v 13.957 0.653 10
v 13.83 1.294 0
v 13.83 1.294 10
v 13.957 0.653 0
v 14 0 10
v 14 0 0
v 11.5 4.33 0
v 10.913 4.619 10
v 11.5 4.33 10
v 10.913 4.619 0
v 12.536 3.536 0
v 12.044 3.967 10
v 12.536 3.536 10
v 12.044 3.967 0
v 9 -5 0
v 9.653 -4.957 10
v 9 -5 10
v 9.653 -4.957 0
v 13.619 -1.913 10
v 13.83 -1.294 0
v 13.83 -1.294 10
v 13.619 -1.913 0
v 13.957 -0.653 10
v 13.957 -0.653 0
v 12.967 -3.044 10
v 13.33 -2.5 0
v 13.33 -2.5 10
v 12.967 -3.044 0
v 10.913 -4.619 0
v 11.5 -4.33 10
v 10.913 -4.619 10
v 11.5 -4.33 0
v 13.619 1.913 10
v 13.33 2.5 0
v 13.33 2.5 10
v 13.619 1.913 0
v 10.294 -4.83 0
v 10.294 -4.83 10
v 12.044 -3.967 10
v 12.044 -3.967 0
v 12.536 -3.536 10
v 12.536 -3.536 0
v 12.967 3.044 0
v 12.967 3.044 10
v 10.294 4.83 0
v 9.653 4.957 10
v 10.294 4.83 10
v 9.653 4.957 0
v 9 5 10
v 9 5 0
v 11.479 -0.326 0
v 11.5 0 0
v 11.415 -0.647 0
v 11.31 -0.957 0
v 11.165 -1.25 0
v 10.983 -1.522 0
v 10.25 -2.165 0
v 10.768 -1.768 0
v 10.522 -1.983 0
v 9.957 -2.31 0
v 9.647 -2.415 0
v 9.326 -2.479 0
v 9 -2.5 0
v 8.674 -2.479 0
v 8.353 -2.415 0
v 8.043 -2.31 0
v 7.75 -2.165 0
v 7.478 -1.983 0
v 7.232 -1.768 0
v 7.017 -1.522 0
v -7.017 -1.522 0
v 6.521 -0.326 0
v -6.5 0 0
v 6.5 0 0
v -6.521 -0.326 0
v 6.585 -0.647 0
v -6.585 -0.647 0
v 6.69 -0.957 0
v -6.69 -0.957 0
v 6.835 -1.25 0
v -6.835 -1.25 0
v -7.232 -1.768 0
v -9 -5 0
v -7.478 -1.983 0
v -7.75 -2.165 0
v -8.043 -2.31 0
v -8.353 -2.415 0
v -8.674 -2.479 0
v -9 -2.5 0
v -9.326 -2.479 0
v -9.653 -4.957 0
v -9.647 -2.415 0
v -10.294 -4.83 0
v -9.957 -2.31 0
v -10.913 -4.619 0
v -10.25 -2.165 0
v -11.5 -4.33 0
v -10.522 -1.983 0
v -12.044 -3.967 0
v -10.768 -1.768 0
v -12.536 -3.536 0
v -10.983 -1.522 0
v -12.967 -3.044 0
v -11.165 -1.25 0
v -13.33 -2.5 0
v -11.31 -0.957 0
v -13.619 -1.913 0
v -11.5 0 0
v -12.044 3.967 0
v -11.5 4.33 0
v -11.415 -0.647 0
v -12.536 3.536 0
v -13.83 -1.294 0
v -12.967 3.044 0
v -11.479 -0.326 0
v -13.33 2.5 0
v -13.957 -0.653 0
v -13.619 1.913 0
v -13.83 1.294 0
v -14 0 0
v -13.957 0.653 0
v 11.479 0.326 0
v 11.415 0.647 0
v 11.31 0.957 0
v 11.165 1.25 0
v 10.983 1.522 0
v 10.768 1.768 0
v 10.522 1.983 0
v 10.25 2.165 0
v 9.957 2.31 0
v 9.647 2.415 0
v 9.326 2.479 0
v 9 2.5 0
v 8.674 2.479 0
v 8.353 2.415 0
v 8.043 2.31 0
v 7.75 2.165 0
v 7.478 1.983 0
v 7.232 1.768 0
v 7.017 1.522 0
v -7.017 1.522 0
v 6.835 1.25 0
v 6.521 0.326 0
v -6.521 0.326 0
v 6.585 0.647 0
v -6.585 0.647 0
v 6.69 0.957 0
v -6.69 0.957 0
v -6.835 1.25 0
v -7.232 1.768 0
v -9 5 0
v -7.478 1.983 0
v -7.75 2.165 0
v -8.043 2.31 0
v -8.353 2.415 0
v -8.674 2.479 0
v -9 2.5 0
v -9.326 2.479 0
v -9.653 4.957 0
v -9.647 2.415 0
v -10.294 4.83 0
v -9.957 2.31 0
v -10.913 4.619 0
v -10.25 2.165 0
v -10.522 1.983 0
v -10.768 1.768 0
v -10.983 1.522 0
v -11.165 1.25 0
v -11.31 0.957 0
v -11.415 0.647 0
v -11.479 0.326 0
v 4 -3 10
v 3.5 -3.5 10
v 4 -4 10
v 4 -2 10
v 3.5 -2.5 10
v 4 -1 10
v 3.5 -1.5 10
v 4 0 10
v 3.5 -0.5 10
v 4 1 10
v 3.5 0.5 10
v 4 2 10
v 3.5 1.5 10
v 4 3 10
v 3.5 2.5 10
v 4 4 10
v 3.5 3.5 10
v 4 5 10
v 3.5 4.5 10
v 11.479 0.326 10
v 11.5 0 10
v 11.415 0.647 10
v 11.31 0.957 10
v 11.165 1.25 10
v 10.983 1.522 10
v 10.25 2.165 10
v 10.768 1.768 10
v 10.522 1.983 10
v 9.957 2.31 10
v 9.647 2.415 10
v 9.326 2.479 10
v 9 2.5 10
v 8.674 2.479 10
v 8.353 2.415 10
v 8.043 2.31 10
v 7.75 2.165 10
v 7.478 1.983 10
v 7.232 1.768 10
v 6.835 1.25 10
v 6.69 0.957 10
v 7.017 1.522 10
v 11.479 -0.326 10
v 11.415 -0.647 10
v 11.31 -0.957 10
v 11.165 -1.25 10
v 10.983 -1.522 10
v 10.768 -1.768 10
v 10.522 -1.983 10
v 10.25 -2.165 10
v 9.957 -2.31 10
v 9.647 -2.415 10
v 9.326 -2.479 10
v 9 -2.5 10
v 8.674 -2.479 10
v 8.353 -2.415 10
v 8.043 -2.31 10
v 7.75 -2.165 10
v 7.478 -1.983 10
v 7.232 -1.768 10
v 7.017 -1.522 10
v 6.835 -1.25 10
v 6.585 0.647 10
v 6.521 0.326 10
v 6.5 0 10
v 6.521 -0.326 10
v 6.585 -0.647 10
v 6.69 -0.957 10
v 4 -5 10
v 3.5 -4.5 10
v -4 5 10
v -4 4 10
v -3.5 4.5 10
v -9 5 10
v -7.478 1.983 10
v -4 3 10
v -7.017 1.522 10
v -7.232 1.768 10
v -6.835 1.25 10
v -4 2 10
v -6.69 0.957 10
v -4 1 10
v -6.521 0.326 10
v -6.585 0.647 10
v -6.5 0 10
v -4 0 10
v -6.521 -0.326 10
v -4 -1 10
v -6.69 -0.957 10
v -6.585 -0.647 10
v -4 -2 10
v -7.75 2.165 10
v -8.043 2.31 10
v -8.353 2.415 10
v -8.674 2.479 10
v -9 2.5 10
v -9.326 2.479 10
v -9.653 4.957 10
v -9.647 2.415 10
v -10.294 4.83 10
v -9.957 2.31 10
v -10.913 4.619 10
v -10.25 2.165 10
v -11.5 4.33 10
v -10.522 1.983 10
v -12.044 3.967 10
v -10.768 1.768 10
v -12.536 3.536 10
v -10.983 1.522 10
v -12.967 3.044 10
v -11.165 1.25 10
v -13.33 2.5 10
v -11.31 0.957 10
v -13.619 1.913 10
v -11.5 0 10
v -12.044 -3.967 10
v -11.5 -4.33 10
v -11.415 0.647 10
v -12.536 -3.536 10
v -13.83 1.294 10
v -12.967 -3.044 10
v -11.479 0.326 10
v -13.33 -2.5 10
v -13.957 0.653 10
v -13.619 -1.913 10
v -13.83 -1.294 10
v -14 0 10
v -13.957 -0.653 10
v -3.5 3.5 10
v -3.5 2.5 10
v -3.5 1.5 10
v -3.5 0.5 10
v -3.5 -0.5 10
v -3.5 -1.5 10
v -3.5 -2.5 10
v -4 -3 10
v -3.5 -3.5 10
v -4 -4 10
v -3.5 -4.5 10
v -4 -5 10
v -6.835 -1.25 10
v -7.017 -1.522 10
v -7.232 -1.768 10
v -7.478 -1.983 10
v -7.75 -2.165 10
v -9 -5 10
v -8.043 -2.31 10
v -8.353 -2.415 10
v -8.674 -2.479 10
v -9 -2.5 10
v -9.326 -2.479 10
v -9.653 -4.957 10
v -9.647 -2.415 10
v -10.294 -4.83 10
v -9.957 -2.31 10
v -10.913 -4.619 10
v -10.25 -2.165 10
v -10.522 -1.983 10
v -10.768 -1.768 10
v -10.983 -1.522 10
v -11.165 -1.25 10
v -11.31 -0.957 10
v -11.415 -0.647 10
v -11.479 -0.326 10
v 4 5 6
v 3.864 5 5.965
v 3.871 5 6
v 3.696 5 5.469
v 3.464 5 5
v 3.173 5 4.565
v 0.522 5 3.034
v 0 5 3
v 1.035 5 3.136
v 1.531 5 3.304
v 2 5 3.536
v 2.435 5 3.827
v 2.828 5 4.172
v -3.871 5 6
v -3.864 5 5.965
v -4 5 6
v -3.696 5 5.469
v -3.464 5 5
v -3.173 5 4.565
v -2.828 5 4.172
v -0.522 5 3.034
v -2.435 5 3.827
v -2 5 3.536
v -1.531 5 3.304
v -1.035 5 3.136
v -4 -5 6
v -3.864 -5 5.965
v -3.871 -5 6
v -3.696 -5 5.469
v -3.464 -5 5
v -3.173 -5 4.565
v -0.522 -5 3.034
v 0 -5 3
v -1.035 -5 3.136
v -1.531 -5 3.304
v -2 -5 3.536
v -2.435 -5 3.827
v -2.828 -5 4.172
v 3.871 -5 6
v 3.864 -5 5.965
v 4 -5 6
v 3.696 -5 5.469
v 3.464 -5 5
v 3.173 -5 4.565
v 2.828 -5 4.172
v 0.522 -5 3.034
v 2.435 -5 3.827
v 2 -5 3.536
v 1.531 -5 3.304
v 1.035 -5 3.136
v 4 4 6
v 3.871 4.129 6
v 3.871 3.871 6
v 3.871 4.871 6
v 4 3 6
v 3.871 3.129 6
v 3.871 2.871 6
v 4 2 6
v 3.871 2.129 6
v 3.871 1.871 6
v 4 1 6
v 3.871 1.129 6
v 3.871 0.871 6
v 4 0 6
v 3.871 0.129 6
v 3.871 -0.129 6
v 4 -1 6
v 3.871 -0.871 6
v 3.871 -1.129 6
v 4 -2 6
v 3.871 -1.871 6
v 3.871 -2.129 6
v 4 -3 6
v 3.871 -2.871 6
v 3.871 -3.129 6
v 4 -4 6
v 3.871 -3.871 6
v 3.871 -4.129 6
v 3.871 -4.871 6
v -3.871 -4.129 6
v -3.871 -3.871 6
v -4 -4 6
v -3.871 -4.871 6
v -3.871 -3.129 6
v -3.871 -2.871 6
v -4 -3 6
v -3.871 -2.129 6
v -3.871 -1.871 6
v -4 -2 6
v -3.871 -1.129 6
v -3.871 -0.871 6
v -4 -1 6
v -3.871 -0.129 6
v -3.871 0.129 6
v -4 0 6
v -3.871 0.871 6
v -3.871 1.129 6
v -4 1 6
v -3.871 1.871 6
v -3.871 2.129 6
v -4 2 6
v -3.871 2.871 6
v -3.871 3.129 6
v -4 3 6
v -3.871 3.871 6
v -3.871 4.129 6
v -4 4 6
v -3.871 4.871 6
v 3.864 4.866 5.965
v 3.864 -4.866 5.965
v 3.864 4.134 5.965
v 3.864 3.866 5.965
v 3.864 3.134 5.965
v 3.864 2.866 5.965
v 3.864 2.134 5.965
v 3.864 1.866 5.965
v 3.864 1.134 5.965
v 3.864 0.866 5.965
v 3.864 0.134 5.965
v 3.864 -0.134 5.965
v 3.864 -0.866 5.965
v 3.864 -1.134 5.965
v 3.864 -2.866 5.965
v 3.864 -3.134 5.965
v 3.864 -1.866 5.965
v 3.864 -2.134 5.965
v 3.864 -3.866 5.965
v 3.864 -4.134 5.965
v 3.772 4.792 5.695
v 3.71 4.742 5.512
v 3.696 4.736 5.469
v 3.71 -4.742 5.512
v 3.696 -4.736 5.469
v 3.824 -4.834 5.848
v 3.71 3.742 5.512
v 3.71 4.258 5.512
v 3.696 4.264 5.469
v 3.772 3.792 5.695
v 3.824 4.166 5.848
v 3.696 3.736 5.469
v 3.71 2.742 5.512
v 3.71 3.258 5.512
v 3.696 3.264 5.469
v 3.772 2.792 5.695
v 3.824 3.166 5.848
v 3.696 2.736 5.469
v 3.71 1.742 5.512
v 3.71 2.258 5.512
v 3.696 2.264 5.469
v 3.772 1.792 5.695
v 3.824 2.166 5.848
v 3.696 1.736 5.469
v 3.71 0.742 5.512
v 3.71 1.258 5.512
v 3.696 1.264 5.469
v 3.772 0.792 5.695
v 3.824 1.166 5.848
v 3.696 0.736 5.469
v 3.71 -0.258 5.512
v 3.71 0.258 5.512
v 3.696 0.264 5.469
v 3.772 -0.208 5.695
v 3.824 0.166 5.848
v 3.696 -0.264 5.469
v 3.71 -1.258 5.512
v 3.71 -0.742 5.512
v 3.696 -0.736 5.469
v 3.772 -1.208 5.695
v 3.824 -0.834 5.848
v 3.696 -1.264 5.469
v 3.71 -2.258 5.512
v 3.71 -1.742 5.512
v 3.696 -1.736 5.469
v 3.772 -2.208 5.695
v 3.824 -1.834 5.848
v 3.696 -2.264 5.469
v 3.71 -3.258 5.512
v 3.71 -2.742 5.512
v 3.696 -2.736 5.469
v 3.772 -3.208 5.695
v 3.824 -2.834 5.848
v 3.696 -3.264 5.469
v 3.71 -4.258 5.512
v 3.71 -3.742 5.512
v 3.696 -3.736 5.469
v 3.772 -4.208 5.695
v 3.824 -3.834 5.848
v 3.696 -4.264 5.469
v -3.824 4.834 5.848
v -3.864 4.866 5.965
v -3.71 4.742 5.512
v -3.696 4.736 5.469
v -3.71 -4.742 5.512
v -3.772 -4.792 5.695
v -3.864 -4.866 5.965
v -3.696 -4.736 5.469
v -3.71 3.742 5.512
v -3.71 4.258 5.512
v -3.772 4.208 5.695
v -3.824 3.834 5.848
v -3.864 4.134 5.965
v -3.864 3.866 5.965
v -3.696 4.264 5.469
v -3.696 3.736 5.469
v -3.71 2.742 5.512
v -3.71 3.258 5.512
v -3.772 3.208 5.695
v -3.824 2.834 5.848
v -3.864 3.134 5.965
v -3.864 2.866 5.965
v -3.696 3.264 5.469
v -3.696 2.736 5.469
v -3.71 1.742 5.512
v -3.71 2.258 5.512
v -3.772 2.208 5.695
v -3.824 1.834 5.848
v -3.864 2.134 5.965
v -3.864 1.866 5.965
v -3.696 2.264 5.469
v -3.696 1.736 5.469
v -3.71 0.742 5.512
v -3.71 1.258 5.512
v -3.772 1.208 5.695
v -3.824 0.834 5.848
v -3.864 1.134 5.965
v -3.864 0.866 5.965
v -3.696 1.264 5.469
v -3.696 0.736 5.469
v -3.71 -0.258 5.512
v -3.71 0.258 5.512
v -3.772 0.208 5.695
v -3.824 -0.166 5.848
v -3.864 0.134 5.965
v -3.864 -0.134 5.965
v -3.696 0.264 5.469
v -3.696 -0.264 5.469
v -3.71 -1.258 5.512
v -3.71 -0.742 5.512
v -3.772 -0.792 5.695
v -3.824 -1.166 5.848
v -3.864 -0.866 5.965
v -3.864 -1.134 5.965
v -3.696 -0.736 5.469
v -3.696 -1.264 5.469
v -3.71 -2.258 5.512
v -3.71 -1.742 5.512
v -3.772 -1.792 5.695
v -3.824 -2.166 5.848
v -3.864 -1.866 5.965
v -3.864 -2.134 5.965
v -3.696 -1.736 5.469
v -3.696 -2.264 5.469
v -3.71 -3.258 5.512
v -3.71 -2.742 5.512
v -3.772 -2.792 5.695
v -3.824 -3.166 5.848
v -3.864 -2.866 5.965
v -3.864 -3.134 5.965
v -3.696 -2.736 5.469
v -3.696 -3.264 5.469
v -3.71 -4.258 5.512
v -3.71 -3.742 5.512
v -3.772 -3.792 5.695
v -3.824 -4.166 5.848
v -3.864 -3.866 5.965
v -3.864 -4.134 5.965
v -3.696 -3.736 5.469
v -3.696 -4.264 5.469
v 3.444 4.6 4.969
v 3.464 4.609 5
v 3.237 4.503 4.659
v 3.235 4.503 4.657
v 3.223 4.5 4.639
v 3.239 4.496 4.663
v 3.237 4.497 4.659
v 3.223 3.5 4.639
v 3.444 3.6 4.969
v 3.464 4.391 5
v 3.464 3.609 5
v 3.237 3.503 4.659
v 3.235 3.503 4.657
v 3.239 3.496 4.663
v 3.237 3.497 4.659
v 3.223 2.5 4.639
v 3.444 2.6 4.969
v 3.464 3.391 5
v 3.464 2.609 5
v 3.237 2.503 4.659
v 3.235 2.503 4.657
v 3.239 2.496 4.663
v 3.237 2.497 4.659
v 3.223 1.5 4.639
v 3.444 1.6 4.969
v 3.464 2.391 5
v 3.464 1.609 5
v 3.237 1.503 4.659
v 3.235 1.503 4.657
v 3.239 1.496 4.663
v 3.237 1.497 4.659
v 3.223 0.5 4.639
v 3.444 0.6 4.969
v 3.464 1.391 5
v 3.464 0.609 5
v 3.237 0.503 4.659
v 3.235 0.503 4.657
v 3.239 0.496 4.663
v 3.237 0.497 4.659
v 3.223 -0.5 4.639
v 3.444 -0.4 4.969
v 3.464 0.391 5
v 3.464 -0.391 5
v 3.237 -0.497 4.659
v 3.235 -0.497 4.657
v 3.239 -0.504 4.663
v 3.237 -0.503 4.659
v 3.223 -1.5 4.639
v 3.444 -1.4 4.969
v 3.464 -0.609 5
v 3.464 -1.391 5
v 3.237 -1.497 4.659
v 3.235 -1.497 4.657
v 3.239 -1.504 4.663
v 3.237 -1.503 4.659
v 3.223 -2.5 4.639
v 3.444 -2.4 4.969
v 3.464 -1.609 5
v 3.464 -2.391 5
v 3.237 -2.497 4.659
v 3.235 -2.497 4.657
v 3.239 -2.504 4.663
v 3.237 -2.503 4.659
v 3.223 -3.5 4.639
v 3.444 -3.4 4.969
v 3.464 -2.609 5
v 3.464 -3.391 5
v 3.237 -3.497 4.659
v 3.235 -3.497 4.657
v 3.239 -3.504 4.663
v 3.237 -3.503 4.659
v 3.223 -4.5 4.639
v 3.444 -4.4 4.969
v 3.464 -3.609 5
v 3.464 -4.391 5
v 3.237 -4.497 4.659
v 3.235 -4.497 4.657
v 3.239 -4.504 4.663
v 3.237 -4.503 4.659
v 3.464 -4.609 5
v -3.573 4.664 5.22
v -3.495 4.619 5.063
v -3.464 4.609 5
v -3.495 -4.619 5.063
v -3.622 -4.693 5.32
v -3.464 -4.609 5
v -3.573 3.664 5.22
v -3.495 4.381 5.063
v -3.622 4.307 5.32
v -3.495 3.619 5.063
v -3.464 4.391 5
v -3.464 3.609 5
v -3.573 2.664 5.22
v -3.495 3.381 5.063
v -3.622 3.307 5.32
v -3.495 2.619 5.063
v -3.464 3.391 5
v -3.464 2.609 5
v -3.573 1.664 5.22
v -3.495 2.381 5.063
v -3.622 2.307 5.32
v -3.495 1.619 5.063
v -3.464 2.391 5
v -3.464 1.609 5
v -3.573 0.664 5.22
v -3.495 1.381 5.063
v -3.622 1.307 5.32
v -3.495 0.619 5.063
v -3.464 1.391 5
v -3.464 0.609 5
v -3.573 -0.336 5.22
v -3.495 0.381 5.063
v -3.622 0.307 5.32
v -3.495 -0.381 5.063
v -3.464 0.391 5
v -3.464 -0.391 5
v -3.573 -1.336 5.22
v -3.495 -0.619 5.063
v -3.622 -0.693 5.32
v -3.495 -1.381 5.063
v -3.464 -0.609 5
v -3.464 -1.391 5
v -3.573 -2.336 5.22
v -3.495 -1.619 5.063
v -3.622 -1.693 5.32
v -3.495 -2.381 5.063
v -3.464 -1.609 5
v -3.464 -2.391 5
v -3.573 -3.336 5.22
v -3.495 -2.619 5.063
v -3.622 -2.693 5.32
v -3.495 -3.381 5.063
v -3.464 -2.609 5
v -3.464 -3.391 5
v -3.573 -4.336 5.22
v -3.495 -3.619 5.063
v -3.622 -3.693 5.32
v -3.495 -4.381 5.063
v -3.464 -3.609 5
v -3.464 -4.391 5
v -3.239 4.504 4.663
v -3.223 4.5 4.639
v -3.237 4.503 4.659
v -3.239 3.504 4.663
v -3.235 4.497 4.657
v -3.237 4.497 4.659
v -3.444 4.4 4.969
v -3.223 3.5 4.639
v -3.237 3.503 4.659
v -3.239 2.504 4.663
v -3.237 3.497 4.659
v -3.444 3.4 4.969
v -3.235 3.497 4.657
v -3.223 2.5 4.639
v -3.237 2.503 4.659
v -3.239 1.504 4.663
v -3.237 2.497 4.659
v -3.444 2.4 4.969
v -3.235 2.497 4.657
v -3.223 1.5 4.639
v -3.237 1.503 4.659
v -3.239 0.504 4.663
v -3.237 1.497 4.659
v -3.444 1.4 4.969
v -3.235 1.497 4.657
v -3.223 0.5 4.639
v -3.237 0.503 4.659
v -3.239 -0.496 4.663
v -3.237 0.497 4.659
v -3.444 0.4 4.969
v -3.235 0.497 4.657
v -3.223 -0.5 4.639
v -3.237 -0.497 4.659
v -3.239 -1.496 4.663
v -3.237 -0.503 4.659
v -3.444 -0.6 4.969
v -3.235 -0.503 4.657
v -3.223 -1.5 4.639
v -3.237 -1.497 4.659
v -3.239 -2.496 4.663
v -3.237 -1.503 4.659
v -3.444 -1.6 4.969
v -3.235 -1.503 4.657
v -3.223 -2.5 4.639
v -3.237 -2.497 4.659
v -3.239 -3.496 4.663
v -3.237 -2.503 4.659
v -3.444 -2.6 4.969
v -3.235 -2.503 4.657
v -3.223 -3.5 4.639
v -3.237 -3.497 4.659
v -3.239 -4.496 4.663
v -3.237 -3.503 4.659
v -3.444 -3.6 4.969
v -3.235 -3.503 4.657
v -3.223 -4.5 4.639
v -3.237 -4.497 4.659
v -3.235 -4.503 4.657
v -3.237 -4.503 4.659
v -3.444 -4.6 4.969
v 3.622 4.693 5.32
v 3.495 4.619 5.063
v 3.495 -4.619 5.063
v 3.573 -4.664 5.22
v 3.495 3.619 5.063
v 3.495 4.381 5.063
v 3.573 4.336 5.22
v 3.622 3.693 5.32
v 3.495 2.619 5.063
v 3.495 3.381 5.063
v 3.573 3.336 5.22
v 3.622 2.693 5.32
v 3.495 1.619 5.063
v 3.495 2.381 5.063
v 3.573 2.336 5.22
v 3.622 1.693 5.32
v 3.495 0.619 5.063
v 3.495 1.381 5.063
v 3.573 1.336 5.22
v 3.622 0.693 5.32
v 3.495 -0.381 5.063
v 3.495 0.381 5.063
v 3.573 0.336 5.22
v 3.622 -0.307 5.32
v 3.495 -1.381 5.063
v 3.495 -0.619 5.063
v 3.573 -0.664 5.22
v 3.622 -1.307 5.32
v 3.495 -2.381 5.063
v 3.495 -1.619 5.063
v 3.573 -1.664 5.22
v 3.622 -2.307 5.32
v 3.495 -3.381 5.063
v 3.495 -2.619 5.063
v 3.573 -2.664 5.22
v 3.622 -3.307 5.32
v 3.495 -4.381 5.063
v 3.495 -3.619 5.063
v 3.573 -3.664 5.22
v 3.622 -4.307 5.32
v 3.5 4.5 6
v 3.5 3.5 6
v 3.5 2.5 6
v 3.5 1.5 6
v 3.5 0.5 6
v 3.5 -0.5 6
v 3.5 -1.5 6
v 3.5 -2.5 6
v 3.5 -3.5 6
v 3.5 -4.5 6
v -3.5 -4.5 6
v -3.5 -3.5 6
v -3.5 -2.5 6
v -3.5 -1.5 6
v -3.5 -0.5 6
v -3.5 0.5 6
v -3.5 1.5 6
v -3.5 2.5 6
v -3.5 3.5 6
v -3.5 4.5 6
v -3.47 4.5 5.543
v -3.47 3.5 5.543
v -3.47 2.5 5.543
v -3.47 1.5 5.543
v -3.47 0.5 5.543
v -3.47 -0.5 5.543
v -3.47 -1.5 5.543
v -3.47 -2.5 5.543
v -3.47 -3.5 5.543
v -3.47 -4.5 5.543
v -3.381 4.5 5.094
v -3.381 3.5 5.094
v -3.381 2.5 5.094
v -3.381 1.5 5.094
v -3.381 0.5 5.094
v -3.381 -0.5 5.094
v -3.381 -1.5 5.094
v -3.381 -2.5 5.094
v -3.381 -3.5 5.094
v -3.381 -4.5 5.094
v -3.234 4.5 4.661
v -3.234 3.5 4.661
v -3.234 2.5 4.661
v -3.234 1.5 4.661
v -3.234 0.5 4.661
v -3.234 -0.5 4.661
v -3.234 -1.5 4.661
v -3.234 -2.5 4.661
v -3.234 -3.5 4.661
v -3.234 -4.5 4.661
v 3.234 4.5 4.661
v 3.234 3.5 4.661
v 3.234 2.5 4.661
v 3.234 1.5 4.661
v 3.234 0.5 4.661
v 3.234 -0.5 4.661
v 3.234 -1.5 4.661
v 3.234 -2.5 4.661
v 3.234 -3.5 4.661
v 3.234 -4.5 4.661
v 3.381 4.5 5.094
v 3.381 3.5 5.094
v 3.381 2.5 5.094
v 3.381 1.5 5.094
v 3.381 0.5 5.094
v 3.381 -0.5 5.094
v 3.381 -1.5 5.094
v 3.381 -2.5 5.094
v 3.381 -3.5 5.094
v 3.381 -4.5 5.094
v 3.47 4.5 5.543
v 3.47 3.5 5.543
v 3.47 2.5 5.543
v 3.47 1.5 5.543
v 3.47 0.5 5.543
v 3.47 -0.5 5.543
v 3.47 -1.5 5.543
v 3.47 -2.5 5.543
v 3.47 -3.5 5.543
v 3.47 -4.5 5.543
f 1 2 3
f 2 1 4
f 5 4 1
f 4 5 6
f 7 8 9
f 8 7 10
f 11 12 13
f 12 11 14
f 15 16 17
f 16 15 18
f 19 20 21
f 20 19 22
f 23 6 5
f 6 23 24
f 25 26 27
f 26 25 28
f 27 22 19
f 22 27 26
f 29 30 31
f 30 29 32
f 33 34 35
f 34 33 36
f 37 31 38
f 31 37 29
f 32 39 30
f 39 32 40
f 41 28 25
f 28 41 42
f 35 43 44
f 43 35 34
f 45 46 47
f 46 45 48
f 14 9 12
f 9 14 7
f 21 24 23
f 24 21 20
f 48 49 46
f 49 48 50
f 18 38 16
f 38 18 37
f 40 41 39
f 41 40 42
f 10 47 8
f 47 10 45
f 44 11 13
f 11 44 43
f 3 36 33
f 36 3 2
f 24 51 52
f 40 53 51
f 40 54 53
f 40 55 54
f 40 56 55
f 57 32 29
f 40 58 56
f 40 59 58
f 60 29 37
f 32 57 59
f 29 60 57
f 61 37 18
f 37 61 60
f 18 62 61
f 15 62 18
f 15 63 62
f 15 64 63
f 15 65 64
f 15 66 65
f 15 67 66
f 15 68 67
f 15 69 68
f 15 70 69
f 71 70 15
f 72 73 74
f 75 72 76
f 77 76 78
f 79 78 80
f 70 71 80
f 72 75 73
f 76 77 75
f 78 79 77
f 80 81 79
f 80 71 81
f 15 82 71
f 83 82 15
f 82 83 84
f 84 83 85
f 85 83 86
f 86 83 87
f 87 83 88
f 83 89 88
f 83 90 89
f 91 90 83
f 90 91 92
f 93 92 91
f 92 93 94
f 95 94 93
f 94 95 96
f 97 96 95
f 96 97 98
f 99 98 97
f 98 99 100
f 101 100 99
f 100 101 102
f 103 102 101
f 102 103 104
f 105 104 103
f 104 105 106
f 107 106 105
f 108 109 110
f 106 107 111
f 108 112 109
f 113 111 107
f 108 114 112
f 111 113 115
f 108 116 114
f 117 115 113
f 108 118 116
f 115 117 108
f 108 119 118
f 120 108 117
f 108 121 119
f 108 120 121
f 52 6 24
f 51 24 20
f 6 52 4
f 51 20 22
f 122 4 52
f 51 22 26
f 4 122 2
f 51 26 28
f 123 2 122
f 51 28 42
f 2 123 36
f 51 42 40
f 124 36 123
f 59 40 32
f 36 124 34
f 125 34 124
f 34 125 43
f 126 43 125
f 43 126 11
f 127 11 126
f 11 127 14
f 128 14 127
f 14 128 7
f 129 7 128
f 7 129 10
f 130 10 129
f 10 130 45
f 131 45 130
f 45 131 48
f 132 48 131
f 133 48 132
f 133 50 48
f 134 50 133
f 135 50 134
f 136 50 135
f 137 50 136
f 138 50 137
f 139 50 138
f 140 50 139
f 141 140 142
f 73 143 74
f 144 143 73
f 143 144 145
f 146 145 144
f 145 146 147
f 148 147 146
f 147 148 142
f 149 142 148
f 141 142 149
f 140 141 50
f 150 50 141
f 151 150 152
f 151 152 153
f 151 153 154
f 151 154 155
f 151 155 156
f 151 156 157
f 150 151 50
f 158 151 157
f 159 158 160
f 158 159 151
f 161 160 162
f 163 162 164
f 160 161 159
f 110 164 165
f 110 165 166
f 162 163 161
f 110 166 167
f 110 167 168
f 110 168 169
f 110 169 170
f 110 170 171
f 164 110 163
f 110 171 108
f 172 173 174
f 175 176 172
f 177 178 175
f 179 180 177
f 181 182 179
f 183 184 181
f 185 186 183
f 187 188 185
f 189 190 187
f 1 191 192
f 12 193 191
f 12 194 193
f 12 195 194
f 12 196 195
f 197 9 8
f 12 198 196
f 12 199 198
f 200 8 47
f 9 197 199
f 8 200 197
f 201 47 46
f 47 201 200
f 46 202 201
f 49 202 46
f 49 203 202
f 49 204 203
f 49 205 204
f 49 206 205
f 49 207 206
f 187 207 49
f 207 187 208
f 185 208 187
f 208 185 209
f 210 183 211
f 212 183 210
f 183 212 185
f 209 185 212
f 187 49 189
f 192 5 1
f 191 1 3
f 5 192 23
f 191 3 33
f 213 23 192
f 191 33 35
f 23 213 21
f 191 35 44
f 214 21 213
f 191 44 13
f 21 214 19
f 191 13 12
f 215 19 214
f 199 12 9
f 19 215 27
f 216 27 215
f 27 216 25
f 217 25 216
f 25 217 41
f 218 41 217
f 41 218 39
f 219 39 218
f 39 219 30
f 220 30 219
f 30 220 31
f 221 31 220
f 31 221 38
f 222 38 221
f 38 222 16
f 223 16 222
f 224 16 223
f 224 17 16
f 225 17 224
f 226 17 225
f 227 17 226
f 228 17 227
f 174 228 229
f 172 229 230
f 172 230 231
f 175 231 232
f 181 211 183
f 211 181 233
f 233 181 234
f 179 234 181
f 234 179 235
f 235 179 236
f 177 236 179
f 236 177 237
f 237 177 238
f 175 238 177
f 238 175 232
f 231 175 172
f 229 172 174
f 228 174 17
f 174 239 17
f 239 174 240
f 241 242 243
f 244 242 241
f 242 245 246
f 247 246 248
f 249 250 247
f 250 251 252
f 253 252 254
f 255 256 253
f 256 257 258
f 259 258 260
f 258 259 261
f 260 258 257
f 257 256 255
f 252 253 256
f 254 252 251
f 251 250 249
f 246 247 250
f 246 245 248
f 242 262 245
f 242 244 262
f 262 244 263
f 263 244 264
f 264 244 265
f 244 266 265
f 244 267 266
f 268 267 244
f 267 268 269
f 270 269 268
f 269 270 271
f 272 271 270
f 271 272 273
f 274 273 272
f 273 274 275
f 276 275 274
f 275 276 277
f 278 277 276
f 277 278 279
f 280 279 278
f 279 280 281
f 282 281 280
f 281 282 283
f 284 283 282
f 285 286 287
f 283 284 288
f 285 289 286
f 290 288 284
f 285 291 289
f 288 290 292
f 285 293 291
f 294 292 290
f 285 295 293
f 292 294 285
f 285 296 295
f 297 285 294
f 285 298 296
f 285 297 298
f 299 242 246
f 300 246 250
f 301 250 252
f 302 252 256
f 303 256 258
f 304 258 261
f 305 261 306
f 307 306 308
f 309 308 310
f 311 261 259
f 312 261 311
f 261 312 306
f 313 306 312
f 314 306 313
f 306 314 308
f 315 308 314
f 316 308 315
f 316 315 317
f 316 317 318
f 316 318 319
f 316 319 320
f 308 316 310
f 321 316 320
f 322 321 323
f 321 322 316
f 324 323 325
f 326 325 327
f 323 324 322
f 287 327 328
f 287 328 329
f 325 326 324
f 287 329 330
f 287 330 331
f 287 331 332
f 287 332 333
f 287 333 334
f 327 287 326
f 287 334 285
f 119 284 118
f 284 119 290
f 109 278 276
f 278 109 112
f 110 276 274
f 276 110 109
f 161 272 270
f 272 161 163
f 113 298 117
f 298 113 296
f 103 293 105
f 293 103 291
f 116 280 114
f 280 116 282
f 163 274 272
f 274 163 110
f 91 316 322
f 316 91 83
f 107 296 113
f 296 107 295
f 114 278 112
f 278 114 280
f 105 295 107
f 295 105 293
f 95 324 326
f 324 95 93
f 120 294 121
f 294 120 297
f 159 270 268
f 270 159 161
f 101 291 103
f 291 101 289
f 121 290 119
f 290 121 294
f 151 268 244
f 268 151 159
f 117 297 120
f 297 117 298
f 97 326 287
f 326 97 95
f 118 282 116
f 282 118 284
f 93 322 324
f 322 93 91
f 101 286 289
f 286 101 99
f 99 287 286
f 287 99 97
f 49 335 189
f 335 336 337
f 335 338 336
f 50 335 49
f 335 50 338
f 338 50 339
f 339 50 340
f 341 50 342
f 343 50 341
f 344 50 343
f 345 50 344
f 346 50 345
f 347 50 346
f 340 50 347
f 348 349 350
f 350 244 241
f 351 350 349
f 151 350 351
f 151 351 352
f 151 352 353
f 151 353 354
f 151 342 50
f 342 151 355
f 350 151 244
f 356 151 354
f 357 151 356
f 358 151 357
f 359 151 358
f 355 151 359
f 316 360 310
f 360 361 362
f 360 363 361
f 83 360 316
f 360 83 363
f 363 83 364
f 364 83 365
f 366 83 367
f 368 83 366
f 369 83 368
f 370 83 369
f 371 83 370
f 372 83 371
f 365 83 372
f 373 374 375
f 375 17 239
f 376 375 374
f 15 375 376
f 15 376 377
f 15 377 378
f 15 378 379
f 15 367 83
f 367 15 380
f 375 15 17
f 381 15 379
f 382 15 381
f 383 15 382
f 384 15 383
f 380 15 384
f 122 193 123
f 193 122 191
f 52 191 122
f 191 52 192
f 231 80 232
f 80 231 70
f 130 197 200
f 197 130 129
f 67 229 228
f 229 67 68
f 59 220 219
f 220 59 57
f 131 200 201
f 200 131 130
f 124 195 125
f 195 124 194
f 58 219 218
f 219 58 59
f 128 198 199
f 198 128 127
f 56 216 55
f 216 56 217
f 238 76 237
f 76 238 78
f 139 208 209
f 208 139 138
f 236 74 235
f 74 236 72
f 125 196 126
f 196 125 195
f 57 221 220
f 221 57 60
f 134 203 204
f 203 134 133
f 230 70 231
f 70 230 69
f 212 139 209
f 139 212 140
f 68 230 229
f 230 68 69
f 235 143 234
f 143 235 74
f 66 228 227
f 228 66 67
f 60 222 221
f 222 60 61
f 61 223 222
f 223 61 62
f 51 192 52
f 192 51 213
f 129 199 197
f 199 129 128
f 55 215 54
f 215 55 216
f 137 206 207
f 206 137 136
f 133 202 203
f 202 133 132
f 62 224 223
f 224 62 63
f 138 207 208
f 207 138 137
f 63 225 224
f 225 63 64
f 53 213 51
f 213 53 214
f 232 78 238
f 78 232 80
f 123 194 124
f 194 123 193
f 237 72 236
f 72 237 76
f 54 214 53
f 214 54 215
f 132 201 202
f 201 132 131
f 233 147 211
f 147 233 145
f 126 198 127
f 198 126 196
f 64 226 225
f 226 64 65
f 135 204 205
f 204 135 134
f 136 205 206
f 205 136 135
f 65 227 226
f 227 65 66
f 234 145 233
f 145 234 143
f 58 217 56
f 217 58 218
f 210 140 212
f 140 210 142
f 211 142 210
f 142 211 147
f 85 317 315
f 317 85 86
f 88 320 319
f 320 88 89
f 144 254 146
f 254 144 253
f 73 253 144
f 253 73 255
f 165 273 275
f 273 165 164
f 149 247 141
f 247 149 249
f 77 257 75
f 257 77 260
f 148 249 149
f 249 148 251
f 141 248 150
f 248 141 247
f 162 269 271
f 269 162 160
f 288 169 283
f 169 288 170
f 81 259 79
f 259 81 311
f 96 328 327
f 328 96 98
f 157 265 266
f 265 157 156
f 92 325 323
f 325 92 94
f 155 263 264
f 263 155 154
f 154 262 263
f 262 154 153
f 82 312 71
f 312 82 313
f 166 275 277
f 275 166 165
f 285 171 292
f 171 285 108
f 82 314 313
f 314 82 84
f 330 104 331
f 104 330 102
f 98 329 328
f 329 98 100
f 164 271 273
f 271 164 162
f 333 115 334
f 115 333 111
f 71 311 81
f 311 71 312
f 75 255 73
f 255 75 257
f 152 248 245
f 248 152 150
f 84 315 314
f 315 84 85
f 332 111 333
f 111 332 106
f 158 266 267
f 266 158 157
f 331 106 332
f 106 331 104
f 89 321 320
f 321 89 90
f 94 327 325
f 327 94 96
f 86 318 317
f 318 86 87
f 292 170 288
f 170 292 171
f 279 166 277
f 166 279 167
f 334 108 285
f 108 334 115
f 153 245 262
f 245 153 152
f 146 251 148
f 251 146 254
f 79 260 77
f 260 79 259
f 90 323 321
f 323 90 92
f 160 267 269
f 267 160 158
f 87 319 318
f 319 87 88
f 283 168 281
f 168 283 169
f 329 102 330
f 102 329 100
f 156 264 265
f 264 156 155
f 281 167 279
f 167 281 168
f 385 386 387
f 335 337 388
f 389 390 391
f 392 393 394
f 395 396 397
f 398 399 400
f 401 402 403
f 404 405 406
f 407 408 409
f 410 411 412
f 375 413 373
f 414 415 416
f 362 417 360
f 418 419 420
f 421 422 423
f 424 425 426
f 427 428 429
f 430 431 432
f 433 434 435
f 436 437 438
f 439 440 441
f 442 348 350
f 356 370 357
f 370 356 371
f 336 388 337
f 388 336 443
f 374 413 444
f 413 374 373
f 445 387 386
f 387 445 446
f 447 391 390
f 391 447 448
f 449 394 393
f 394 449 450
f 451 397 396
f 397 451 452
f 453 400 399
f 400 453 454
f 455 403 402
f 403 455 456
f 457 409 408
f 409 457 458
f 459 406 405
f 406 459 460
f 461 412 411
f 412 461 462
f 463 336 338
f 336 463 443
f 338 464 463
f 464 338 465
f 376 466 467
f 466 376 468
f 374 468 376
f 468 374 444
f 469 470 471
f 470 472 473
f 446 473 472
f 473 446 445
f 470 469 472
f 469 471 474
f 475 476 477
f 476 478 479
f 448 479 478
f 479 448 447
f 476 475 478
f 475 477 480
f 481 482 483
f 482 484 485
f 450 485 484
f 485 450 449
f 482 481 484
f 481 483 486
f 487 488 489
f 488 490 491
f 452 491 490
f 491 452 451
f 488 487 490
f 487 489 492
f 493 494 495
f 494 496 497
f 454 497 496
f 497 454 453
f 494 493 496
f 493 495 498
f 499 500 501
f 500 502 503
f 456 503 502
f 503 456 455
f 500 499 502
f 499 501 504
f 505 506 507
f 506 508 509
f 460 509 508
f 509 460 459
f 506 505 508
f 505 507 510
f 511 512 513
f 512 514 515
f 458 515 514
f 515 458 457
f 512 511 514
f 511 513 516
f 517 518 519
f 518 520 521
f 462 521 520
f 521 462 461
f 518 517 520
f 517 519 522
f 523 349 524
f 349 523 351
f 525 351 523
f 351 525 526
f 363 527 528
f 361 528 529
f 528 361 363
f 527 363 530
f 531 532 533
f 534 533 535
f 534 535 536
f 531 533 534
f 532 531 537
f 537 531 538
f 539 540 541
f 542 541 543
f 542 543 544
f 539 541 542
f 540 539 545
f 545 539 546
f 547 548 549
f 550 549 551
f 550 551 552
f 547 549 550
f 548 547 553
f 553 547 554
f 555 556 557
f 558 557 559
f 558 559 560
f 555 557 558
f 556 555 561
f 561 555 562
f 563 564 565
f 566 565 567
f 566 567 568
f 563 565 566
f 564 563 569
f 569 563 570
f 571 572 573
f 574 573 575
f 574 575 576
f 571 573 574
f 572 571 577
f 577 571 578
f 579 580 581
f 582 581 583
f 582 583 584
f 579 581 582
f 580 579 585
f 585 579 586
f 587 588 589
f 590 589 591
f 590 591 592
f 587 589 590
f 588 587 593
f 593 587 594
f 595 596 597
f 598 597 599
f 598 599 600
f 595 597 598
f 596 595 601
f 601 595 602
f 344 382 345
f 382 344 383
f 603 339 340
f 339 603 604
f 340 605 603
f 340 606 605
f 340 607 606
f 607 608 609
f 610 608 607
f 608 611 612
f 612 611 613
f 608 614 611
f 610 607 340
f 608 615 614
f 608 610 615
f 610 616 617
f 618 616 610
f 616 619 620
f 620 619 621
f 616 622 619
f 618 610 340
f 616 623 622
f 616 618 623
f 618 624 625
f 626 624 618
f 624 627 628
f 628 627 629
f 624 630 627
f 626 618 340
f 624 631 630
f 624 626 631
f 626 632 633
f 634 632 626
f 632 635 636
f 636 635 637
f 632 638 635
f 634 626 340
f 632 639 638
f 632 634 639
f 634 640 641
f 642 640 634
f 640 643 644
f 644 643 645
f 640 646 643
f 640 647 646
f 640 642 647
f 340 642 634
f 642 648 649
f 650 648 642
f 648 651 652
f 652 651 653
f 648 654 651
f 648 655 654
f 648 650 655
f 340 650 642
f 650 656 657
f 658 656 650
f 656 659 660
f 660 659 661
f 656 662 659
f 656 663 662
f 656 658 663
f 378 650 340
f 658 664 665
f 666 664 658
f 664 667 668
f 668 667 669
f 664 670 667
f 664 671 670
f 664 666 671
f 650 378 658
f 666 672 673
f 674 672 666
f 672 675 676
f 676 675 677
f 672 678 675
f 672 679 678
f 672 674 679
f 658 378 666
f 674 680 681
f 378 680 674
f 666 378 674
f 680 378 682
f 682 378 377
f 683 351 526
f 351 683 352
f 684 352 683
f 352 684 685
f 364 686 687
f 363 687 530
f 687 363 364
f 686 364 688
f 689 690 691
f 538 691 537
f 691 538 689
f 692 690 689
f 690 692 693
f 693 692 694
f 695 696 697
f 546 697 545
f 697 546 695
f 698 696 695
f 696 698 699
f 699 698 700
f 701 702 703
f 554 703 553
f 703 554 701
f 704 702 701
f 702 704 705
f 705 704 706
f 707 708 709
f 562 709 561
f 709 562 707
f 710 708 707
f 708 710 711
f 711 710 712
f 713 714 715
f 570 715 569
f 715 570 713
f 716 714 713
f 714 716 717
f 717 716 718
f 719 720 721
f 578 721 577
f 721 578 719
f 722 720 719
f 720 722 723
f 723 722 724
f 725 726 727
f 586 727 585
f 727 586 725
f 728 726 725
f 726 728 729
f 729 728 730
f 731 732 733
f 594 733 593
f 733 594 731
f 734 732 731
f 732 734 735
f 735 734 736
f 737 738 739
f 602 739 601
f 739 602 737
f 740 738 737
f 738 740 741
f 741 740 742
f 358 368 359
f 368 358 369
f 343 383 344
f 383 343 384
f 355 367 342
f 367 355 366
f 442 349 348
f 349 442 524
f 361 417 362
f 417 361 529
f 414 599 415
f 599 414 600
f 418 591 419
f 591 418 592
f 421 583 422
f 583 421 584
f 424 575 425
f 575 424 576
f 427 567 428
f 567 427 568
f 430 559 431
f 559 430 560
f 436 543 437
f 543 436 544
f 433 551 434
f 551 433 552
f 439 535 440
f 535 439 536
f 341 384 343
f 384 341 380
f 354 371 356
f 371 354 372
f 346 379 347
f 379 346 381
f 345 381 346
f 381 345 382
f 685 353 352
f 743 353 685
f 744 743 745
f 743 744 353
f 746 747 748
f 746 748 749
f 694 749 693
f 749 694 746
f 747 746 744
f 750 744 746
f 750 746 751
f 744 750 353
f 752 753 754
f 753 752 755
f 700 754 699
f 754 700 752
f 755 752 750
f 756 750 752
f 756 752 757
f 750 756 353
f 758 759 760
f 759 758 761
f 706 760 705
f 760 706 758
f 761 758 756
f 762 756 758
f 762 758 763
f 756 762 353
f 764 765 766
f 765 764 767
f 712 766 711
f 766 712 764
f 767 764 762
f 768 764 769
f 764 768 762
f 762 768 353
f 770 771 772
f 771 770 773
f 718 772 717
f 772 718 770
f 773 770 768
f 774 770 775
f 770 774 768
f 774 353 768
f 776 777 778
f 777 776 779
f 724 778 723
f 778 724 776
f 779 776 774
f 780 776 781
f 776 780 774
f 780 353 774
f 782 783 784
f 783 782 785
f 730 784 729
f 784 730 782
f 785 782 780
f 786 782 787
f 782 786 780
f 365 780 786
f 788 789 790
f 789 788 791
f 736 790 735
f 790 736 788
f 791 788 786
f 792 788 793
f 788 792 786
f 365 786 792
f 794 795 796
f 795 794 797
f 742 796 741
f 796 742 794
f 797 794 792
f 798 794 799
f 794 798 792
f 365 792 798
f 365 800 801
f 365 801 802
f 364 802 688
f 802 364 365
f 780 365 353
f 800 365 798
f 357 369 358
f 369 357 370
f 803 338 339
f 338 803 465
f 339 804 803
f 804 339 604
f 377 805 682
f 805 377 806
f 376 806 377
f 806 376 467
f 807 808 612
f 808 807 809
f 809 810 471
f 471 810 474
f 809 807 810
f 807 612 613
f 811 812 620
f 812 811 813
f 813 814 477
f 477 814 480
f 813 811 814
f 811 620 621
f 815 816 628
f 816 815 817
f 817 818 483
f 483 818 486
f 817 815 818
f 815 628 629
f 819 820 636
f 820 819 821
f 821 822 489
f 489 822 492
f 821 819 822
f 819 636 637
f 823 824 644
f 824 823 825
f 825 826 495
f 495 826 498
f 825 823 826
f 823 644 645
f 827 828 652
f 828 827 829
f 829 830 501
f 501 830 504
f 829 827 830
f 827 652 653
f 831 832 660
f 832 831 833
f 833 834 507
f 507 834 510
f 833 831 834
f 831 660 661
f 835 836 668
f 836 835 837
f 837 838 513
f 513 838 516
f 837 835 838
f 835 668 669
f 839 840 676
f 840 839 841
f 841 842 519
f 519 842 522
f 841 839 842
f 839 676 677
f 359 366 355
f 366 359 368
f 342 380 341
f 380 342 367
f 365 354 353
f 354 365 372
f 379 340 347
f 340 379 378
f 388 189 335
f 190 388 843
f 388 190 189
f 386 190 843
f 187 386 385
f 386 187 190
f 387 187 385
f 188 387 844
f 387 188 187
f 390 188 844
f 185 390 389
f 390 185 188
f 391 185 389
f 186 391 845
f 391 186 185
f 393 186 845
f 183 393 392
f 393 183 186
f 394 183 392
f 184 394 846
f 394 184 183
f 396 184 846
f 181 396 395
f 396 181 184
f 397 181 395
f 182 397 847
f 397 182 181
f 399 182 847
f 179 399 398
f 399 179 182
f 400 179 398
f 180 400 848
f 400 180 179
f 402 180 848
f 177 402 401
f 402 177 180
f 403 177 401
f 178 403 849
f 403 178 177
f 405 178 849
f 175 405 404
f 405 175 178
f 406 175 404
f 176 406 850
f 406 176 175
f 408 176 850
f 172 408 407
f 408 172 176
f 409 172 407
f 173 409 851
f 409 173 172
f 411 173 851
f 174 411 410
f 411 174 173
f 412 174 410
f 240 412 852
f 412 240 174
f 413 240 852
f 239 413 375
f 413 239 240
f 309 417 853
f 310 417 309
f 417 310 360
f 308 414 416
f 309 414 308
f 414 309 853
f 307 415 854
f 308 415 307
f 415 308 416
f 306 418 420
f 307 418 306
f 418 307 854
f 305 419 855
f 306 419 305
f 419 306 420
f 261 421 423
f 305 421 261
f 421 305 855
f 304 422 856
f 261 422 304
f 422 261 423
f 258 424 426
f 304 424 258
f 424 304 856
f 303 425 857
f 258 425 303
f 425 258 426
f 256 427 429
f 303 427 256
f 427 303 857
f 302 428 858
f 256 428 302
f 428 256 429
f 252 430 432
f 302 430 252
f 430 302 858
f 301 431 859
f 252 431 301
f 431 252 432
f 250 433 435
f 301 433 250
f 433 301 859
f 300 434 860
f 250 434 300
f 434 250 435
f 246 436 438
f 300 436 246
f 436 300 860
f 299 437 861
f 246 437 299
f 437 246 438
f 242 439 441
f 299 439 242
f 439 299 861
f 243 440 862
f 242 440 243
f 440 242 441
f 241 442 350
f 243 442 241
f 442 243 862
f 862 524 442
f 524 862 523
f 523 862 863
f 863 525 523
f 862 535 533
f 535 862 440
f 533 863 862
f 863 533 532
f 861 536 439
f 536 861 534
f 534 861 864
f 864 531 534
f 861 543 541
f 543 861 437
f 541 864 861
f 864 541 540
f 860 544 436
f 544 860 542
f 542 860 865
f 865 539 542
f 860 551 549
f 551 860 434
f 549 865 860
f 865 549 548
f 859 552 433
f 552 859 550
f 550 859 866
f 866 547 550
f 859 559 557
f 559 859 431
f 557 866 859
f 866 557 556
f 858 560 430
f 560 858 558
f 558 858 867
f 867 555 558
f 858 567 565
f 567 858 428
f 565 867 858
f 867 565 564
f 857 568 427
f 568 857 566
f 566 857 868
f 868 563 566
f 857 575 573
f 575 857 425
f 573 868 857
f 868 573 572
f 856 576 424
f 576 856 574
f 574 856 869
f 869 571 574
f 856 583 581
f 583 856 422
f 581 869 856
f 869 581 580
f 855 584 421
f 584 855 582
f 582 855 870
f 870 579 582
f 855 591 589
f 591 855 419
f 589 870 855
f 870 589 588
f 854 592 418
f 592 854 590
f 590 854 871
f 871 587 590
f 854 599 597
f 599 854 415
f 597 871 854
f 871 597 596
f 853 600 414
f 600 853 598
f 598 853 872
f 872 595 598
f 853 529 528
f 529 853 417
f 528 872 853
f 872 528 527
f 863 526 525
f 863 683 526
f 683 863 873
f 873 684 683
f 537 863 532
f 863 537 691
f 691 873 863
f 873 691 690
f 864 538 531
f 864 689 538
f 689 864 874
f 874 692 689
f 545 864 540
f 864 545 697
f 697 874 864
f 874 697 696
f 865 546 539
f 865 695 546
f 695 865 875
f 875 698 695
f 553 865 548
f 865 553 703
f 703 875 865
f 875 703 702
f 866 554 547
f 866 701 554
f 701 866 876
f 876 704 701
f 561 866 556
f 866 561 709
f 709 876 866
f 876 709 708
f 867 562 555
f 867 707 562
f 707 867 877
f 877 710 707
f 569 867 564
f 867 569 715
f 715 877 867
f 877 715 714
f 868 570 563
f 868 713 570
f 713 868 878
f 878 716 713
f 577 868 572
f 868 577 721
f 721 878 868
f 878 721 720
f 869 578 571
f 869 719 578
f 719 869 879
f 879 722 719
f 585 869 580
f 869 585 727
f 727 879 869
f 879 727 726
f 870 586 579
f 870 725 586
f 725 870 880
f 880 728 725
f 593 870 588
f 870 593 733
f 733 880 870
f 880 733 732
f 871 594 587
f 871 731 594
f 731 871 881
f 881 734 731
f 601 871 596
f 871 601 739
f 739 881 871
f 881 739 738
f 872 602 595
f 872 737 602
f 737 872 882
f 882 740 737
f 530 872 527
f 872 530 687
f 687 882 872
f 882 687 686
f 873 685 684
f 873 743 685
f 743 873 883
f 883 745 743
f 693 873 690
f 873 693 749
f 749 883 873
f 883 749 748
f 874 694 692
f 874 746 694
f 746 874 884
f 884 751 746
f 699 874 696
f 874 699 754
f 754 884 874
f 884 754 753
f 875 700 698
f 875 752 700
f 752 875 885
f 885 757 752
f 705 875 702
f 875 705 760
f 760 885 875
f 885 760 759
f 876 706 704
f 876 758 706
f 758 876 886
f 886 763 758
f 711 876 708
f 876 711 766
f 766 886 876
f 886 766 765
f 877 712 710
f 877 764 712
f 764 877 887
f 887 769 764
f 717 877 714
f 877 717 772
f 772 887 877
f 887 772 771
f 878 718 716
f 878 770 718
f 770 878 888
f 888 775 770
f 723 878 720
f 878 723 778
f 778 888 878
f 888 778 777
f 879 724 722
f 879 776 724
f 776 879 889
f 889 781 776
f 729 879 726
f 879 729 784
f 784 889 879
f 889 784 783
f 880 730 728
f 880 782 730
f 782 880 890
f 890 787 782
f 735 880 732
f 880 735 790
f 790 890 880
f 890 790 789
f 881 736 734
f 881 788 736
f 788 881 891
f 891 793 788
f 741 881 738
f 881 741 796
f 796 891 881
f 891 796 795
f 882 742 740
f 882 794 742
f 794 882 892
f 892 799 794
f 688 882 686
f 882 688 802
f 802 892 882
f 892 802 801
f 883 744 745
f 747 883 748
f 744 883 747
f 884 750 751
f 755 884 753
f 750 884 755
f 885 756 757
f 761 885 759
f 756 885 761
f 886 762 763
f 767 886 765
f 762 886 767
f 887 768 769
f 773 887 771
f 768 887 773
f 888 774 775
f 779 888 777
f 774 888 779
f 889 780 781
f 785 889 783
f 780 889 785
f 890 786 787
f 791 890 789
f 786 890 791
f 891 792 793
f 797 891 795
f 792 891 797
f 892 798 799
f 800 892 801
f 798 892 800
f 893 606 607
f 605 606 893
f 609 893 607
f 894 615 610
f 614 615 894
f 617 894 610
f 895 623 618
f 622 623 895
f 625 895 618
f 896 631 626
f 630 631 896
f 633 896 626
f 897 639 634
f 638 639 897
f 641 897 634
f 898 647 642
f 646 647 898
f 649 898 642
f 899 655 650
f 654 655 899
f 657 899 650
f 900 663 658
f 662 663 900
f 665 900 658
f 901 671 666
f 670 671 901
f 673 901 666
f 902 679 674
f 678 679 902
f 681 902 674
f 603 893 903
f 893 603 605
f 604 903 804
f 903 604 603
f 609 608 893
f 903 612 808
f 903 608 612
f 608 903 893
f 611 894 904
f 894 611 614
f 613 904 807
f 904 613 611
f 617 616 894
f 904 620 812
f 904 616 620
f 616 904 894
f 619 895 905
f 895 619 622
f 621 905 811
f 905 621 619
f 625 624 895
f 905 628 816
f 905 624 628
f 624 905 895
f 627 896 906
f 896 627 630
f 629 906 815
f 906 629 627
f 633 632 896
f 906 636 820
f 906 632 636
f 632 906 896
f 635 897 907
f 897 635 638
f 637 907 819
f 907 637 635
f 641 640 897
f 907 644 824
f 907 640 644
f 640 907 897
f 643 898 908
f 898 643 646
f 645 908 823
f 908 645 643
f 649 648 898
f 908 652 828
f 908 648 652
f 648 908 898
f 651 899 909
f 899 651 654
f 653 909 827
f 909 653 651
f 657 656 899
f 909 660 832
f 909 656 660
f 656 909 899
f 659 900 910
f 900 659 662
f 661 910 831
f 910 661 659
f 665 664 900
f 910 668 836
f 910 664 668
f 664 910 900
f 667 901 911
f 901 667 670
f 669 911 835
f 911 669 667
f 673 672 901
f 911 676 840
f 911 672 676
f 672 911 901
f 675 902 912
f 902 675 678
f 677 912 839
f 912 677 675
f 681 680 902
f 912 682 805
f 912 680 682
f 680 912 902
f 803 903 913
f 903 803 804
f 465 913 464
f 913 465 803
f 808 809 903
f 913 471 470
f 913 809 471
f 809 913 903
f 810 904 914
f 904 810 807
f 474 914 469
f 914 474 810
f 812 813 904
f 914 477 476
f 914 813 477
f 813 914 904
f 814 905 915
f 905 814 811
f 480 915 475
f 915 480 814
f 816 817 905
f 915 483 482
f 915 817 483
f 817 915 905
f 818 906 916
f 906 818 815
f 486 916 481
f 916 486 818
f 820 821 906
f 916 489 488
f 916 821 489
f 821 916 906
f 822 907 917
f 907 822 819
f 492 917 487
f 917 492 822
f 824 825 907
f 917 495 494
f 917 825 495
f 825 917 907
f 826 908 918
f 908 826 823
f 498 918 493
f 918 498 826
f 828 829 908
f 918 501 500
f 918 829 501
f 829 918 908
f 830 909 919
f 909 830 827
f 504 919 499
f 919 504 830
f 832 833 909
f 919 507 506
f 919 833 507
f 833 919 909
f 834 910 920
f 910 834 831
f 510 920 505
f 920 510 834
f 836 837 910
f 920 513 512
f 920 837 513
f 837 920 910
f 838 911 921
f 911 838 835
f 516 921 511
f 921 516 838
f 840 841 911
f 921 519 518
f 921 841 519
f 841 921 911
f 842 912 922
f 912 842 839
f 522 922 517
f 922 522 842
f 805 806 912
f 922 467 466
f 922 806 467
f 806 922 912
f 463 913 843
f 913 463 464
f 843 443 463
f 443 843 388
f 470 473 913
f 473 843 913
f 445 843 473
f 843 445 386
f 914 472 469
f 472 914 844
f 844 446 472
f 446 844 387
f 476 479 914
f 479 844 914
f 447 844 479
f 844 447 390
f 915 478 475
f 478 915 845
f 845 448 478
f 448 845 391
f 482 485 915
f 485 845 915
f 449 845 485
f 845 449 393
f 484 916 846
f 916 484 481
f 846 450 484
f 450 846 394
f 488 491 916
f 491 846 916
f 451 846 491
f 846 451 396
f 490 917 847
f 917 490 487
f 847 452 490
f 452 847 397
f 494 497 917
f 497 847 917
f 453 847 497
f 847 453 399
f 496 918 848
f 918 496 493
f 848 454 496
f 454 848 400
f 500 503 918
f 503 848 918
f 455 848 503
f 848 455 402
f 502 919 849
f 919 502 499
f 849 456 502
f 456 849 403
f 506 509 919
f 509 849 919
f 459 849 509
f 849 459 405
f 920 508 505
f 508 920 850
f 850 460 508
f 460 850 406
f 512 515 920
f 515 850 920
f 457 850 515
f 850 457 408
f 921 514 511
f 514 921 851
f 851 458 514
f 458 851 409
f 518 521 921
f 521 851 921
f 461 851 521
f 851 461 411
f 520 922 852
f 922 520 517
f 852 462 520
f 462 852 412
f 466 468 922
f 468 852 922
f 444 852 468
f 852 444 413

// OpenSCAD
//###############################################################################
//#                                                                             #
//###############################################################################
//#    Copyright 2020 Dirk Heisswolf                                            #
//#    This file is part of the DIY Laser Bed project.                          #
//#                                                                             #
//#    This project is free software: you can redistribute it and/or modify     #
//#    it under the terms of the GNU General Public License as published by     #
//#    the Free Software Foundation, either version 3 of the License, or        #
//#    (at your option) any later version.                                      #
//#                                                                             #
//#    This project is distributed in the hope that it will be useful,          #
//#    but WITHOUT ANY WARRANTY; without even the implied warranty of           #
//#    MERCHANTABILITY or FITNESS FOR A PARTICULAR PURPOSE.  See the            #
//#    GNU General Public License for more details.                             #
//#                                                                             #
//#    You should have received a copy of the GNU General Public License        #
//#    along with this project.  If not, see <http://www.gnu.org/licenses/>.    #
//#                                                                             #
//###############################################################################
//# Description:                                                                #
//#   A fitting to place a thermometer in water flow of a 6mm hose.             #
//#                                                                             #
//###############################################################################
//# Version History:                                                            #
//#   February 27, 2020                                                         #
//#      - Initial release                                                      #
//#                                                                             #
//###############################################################################
//Parameters
$d_cable     =  8;                  //diameter of the cable
$fn          = 48;

module cable_bracket() {
    //Body
    difference() {
        union() {
            translate([($d_cable/2)+5,0,0])  cylinder($d_cable+2,d=10);
            translate([-($d_cable/2)-5,0,0]) cylinder($d_cable+2,d=10);
            translate([0,0,($d_cable/2)+1]) cube([$d_cable+10,10,$d_cable+2],true);            
        }
        union() {
            translate([($d_cable/2)+5,0,-1])  cylinder($d_cable+4,d=5);
            translate([-($d_cable/2)-5,0,-1]) cylinder($d_cable+4,d=5);
            translate([0,0,$d_cable+2]) cube([$d_cable,12,$d_cable],true);          
            translate([0,6,$d_cable-1]) rotate([90,0,0]) cylinder(12,d=$d_cable);
        }
    }
    //Grip
      translate([0,0,2+$d_cable/2]) rotate([0,0,0])    linear_extrude($d_cable/2) grip_profile();
      translate([0,0,2+$d_cable/2]) rotate([0,0,180])  linear_extrude($d_cable/2) grip_profile();
      translate([0,0,2+$d_cable/2]) rotate([90,180,0]) rotate_extrude(angle=180) grip_profile();

        

}

module grip_profile() {
    polygon([[$d_cable/2+1,-5],
             [$d_cable/2,-5],
             [-0.5+$d_cable/2,-4.5],
             [$d_cable/2,-4],
             [-0.5+$d_cable/2,-3.5],
             [$d_cable/2,-3],
             [-0.5+$d_cable/2,-2.5],
             [$d_cable/2,-2],
             [-0.5+$d_cable/2,-1.5],
             [$d_cable/2,-1],
             [-0.5+$d_cable/2,-0.5],
             [$d_cable/2,-0],
             [-0.5+$d_cable/2,0.5],
             [$d_cable/2,1],
             [-0.5+$d_cable/2,1.5],
             [$d_cable/2,2],
             [-0.5+$d_cable/2,2.5],
             [$d_cable/2,3],
             [-0.5+$d_cable/2,3.5],
             [$d_cable/2,4],
             [-0.5+$d_cable/2,4.5],
             [$d_cable/2,5],    
             [$d_cable/2+1,5],    
    ]);
    
    
}

//if ($preview) {

    cable_bracket();
//}
